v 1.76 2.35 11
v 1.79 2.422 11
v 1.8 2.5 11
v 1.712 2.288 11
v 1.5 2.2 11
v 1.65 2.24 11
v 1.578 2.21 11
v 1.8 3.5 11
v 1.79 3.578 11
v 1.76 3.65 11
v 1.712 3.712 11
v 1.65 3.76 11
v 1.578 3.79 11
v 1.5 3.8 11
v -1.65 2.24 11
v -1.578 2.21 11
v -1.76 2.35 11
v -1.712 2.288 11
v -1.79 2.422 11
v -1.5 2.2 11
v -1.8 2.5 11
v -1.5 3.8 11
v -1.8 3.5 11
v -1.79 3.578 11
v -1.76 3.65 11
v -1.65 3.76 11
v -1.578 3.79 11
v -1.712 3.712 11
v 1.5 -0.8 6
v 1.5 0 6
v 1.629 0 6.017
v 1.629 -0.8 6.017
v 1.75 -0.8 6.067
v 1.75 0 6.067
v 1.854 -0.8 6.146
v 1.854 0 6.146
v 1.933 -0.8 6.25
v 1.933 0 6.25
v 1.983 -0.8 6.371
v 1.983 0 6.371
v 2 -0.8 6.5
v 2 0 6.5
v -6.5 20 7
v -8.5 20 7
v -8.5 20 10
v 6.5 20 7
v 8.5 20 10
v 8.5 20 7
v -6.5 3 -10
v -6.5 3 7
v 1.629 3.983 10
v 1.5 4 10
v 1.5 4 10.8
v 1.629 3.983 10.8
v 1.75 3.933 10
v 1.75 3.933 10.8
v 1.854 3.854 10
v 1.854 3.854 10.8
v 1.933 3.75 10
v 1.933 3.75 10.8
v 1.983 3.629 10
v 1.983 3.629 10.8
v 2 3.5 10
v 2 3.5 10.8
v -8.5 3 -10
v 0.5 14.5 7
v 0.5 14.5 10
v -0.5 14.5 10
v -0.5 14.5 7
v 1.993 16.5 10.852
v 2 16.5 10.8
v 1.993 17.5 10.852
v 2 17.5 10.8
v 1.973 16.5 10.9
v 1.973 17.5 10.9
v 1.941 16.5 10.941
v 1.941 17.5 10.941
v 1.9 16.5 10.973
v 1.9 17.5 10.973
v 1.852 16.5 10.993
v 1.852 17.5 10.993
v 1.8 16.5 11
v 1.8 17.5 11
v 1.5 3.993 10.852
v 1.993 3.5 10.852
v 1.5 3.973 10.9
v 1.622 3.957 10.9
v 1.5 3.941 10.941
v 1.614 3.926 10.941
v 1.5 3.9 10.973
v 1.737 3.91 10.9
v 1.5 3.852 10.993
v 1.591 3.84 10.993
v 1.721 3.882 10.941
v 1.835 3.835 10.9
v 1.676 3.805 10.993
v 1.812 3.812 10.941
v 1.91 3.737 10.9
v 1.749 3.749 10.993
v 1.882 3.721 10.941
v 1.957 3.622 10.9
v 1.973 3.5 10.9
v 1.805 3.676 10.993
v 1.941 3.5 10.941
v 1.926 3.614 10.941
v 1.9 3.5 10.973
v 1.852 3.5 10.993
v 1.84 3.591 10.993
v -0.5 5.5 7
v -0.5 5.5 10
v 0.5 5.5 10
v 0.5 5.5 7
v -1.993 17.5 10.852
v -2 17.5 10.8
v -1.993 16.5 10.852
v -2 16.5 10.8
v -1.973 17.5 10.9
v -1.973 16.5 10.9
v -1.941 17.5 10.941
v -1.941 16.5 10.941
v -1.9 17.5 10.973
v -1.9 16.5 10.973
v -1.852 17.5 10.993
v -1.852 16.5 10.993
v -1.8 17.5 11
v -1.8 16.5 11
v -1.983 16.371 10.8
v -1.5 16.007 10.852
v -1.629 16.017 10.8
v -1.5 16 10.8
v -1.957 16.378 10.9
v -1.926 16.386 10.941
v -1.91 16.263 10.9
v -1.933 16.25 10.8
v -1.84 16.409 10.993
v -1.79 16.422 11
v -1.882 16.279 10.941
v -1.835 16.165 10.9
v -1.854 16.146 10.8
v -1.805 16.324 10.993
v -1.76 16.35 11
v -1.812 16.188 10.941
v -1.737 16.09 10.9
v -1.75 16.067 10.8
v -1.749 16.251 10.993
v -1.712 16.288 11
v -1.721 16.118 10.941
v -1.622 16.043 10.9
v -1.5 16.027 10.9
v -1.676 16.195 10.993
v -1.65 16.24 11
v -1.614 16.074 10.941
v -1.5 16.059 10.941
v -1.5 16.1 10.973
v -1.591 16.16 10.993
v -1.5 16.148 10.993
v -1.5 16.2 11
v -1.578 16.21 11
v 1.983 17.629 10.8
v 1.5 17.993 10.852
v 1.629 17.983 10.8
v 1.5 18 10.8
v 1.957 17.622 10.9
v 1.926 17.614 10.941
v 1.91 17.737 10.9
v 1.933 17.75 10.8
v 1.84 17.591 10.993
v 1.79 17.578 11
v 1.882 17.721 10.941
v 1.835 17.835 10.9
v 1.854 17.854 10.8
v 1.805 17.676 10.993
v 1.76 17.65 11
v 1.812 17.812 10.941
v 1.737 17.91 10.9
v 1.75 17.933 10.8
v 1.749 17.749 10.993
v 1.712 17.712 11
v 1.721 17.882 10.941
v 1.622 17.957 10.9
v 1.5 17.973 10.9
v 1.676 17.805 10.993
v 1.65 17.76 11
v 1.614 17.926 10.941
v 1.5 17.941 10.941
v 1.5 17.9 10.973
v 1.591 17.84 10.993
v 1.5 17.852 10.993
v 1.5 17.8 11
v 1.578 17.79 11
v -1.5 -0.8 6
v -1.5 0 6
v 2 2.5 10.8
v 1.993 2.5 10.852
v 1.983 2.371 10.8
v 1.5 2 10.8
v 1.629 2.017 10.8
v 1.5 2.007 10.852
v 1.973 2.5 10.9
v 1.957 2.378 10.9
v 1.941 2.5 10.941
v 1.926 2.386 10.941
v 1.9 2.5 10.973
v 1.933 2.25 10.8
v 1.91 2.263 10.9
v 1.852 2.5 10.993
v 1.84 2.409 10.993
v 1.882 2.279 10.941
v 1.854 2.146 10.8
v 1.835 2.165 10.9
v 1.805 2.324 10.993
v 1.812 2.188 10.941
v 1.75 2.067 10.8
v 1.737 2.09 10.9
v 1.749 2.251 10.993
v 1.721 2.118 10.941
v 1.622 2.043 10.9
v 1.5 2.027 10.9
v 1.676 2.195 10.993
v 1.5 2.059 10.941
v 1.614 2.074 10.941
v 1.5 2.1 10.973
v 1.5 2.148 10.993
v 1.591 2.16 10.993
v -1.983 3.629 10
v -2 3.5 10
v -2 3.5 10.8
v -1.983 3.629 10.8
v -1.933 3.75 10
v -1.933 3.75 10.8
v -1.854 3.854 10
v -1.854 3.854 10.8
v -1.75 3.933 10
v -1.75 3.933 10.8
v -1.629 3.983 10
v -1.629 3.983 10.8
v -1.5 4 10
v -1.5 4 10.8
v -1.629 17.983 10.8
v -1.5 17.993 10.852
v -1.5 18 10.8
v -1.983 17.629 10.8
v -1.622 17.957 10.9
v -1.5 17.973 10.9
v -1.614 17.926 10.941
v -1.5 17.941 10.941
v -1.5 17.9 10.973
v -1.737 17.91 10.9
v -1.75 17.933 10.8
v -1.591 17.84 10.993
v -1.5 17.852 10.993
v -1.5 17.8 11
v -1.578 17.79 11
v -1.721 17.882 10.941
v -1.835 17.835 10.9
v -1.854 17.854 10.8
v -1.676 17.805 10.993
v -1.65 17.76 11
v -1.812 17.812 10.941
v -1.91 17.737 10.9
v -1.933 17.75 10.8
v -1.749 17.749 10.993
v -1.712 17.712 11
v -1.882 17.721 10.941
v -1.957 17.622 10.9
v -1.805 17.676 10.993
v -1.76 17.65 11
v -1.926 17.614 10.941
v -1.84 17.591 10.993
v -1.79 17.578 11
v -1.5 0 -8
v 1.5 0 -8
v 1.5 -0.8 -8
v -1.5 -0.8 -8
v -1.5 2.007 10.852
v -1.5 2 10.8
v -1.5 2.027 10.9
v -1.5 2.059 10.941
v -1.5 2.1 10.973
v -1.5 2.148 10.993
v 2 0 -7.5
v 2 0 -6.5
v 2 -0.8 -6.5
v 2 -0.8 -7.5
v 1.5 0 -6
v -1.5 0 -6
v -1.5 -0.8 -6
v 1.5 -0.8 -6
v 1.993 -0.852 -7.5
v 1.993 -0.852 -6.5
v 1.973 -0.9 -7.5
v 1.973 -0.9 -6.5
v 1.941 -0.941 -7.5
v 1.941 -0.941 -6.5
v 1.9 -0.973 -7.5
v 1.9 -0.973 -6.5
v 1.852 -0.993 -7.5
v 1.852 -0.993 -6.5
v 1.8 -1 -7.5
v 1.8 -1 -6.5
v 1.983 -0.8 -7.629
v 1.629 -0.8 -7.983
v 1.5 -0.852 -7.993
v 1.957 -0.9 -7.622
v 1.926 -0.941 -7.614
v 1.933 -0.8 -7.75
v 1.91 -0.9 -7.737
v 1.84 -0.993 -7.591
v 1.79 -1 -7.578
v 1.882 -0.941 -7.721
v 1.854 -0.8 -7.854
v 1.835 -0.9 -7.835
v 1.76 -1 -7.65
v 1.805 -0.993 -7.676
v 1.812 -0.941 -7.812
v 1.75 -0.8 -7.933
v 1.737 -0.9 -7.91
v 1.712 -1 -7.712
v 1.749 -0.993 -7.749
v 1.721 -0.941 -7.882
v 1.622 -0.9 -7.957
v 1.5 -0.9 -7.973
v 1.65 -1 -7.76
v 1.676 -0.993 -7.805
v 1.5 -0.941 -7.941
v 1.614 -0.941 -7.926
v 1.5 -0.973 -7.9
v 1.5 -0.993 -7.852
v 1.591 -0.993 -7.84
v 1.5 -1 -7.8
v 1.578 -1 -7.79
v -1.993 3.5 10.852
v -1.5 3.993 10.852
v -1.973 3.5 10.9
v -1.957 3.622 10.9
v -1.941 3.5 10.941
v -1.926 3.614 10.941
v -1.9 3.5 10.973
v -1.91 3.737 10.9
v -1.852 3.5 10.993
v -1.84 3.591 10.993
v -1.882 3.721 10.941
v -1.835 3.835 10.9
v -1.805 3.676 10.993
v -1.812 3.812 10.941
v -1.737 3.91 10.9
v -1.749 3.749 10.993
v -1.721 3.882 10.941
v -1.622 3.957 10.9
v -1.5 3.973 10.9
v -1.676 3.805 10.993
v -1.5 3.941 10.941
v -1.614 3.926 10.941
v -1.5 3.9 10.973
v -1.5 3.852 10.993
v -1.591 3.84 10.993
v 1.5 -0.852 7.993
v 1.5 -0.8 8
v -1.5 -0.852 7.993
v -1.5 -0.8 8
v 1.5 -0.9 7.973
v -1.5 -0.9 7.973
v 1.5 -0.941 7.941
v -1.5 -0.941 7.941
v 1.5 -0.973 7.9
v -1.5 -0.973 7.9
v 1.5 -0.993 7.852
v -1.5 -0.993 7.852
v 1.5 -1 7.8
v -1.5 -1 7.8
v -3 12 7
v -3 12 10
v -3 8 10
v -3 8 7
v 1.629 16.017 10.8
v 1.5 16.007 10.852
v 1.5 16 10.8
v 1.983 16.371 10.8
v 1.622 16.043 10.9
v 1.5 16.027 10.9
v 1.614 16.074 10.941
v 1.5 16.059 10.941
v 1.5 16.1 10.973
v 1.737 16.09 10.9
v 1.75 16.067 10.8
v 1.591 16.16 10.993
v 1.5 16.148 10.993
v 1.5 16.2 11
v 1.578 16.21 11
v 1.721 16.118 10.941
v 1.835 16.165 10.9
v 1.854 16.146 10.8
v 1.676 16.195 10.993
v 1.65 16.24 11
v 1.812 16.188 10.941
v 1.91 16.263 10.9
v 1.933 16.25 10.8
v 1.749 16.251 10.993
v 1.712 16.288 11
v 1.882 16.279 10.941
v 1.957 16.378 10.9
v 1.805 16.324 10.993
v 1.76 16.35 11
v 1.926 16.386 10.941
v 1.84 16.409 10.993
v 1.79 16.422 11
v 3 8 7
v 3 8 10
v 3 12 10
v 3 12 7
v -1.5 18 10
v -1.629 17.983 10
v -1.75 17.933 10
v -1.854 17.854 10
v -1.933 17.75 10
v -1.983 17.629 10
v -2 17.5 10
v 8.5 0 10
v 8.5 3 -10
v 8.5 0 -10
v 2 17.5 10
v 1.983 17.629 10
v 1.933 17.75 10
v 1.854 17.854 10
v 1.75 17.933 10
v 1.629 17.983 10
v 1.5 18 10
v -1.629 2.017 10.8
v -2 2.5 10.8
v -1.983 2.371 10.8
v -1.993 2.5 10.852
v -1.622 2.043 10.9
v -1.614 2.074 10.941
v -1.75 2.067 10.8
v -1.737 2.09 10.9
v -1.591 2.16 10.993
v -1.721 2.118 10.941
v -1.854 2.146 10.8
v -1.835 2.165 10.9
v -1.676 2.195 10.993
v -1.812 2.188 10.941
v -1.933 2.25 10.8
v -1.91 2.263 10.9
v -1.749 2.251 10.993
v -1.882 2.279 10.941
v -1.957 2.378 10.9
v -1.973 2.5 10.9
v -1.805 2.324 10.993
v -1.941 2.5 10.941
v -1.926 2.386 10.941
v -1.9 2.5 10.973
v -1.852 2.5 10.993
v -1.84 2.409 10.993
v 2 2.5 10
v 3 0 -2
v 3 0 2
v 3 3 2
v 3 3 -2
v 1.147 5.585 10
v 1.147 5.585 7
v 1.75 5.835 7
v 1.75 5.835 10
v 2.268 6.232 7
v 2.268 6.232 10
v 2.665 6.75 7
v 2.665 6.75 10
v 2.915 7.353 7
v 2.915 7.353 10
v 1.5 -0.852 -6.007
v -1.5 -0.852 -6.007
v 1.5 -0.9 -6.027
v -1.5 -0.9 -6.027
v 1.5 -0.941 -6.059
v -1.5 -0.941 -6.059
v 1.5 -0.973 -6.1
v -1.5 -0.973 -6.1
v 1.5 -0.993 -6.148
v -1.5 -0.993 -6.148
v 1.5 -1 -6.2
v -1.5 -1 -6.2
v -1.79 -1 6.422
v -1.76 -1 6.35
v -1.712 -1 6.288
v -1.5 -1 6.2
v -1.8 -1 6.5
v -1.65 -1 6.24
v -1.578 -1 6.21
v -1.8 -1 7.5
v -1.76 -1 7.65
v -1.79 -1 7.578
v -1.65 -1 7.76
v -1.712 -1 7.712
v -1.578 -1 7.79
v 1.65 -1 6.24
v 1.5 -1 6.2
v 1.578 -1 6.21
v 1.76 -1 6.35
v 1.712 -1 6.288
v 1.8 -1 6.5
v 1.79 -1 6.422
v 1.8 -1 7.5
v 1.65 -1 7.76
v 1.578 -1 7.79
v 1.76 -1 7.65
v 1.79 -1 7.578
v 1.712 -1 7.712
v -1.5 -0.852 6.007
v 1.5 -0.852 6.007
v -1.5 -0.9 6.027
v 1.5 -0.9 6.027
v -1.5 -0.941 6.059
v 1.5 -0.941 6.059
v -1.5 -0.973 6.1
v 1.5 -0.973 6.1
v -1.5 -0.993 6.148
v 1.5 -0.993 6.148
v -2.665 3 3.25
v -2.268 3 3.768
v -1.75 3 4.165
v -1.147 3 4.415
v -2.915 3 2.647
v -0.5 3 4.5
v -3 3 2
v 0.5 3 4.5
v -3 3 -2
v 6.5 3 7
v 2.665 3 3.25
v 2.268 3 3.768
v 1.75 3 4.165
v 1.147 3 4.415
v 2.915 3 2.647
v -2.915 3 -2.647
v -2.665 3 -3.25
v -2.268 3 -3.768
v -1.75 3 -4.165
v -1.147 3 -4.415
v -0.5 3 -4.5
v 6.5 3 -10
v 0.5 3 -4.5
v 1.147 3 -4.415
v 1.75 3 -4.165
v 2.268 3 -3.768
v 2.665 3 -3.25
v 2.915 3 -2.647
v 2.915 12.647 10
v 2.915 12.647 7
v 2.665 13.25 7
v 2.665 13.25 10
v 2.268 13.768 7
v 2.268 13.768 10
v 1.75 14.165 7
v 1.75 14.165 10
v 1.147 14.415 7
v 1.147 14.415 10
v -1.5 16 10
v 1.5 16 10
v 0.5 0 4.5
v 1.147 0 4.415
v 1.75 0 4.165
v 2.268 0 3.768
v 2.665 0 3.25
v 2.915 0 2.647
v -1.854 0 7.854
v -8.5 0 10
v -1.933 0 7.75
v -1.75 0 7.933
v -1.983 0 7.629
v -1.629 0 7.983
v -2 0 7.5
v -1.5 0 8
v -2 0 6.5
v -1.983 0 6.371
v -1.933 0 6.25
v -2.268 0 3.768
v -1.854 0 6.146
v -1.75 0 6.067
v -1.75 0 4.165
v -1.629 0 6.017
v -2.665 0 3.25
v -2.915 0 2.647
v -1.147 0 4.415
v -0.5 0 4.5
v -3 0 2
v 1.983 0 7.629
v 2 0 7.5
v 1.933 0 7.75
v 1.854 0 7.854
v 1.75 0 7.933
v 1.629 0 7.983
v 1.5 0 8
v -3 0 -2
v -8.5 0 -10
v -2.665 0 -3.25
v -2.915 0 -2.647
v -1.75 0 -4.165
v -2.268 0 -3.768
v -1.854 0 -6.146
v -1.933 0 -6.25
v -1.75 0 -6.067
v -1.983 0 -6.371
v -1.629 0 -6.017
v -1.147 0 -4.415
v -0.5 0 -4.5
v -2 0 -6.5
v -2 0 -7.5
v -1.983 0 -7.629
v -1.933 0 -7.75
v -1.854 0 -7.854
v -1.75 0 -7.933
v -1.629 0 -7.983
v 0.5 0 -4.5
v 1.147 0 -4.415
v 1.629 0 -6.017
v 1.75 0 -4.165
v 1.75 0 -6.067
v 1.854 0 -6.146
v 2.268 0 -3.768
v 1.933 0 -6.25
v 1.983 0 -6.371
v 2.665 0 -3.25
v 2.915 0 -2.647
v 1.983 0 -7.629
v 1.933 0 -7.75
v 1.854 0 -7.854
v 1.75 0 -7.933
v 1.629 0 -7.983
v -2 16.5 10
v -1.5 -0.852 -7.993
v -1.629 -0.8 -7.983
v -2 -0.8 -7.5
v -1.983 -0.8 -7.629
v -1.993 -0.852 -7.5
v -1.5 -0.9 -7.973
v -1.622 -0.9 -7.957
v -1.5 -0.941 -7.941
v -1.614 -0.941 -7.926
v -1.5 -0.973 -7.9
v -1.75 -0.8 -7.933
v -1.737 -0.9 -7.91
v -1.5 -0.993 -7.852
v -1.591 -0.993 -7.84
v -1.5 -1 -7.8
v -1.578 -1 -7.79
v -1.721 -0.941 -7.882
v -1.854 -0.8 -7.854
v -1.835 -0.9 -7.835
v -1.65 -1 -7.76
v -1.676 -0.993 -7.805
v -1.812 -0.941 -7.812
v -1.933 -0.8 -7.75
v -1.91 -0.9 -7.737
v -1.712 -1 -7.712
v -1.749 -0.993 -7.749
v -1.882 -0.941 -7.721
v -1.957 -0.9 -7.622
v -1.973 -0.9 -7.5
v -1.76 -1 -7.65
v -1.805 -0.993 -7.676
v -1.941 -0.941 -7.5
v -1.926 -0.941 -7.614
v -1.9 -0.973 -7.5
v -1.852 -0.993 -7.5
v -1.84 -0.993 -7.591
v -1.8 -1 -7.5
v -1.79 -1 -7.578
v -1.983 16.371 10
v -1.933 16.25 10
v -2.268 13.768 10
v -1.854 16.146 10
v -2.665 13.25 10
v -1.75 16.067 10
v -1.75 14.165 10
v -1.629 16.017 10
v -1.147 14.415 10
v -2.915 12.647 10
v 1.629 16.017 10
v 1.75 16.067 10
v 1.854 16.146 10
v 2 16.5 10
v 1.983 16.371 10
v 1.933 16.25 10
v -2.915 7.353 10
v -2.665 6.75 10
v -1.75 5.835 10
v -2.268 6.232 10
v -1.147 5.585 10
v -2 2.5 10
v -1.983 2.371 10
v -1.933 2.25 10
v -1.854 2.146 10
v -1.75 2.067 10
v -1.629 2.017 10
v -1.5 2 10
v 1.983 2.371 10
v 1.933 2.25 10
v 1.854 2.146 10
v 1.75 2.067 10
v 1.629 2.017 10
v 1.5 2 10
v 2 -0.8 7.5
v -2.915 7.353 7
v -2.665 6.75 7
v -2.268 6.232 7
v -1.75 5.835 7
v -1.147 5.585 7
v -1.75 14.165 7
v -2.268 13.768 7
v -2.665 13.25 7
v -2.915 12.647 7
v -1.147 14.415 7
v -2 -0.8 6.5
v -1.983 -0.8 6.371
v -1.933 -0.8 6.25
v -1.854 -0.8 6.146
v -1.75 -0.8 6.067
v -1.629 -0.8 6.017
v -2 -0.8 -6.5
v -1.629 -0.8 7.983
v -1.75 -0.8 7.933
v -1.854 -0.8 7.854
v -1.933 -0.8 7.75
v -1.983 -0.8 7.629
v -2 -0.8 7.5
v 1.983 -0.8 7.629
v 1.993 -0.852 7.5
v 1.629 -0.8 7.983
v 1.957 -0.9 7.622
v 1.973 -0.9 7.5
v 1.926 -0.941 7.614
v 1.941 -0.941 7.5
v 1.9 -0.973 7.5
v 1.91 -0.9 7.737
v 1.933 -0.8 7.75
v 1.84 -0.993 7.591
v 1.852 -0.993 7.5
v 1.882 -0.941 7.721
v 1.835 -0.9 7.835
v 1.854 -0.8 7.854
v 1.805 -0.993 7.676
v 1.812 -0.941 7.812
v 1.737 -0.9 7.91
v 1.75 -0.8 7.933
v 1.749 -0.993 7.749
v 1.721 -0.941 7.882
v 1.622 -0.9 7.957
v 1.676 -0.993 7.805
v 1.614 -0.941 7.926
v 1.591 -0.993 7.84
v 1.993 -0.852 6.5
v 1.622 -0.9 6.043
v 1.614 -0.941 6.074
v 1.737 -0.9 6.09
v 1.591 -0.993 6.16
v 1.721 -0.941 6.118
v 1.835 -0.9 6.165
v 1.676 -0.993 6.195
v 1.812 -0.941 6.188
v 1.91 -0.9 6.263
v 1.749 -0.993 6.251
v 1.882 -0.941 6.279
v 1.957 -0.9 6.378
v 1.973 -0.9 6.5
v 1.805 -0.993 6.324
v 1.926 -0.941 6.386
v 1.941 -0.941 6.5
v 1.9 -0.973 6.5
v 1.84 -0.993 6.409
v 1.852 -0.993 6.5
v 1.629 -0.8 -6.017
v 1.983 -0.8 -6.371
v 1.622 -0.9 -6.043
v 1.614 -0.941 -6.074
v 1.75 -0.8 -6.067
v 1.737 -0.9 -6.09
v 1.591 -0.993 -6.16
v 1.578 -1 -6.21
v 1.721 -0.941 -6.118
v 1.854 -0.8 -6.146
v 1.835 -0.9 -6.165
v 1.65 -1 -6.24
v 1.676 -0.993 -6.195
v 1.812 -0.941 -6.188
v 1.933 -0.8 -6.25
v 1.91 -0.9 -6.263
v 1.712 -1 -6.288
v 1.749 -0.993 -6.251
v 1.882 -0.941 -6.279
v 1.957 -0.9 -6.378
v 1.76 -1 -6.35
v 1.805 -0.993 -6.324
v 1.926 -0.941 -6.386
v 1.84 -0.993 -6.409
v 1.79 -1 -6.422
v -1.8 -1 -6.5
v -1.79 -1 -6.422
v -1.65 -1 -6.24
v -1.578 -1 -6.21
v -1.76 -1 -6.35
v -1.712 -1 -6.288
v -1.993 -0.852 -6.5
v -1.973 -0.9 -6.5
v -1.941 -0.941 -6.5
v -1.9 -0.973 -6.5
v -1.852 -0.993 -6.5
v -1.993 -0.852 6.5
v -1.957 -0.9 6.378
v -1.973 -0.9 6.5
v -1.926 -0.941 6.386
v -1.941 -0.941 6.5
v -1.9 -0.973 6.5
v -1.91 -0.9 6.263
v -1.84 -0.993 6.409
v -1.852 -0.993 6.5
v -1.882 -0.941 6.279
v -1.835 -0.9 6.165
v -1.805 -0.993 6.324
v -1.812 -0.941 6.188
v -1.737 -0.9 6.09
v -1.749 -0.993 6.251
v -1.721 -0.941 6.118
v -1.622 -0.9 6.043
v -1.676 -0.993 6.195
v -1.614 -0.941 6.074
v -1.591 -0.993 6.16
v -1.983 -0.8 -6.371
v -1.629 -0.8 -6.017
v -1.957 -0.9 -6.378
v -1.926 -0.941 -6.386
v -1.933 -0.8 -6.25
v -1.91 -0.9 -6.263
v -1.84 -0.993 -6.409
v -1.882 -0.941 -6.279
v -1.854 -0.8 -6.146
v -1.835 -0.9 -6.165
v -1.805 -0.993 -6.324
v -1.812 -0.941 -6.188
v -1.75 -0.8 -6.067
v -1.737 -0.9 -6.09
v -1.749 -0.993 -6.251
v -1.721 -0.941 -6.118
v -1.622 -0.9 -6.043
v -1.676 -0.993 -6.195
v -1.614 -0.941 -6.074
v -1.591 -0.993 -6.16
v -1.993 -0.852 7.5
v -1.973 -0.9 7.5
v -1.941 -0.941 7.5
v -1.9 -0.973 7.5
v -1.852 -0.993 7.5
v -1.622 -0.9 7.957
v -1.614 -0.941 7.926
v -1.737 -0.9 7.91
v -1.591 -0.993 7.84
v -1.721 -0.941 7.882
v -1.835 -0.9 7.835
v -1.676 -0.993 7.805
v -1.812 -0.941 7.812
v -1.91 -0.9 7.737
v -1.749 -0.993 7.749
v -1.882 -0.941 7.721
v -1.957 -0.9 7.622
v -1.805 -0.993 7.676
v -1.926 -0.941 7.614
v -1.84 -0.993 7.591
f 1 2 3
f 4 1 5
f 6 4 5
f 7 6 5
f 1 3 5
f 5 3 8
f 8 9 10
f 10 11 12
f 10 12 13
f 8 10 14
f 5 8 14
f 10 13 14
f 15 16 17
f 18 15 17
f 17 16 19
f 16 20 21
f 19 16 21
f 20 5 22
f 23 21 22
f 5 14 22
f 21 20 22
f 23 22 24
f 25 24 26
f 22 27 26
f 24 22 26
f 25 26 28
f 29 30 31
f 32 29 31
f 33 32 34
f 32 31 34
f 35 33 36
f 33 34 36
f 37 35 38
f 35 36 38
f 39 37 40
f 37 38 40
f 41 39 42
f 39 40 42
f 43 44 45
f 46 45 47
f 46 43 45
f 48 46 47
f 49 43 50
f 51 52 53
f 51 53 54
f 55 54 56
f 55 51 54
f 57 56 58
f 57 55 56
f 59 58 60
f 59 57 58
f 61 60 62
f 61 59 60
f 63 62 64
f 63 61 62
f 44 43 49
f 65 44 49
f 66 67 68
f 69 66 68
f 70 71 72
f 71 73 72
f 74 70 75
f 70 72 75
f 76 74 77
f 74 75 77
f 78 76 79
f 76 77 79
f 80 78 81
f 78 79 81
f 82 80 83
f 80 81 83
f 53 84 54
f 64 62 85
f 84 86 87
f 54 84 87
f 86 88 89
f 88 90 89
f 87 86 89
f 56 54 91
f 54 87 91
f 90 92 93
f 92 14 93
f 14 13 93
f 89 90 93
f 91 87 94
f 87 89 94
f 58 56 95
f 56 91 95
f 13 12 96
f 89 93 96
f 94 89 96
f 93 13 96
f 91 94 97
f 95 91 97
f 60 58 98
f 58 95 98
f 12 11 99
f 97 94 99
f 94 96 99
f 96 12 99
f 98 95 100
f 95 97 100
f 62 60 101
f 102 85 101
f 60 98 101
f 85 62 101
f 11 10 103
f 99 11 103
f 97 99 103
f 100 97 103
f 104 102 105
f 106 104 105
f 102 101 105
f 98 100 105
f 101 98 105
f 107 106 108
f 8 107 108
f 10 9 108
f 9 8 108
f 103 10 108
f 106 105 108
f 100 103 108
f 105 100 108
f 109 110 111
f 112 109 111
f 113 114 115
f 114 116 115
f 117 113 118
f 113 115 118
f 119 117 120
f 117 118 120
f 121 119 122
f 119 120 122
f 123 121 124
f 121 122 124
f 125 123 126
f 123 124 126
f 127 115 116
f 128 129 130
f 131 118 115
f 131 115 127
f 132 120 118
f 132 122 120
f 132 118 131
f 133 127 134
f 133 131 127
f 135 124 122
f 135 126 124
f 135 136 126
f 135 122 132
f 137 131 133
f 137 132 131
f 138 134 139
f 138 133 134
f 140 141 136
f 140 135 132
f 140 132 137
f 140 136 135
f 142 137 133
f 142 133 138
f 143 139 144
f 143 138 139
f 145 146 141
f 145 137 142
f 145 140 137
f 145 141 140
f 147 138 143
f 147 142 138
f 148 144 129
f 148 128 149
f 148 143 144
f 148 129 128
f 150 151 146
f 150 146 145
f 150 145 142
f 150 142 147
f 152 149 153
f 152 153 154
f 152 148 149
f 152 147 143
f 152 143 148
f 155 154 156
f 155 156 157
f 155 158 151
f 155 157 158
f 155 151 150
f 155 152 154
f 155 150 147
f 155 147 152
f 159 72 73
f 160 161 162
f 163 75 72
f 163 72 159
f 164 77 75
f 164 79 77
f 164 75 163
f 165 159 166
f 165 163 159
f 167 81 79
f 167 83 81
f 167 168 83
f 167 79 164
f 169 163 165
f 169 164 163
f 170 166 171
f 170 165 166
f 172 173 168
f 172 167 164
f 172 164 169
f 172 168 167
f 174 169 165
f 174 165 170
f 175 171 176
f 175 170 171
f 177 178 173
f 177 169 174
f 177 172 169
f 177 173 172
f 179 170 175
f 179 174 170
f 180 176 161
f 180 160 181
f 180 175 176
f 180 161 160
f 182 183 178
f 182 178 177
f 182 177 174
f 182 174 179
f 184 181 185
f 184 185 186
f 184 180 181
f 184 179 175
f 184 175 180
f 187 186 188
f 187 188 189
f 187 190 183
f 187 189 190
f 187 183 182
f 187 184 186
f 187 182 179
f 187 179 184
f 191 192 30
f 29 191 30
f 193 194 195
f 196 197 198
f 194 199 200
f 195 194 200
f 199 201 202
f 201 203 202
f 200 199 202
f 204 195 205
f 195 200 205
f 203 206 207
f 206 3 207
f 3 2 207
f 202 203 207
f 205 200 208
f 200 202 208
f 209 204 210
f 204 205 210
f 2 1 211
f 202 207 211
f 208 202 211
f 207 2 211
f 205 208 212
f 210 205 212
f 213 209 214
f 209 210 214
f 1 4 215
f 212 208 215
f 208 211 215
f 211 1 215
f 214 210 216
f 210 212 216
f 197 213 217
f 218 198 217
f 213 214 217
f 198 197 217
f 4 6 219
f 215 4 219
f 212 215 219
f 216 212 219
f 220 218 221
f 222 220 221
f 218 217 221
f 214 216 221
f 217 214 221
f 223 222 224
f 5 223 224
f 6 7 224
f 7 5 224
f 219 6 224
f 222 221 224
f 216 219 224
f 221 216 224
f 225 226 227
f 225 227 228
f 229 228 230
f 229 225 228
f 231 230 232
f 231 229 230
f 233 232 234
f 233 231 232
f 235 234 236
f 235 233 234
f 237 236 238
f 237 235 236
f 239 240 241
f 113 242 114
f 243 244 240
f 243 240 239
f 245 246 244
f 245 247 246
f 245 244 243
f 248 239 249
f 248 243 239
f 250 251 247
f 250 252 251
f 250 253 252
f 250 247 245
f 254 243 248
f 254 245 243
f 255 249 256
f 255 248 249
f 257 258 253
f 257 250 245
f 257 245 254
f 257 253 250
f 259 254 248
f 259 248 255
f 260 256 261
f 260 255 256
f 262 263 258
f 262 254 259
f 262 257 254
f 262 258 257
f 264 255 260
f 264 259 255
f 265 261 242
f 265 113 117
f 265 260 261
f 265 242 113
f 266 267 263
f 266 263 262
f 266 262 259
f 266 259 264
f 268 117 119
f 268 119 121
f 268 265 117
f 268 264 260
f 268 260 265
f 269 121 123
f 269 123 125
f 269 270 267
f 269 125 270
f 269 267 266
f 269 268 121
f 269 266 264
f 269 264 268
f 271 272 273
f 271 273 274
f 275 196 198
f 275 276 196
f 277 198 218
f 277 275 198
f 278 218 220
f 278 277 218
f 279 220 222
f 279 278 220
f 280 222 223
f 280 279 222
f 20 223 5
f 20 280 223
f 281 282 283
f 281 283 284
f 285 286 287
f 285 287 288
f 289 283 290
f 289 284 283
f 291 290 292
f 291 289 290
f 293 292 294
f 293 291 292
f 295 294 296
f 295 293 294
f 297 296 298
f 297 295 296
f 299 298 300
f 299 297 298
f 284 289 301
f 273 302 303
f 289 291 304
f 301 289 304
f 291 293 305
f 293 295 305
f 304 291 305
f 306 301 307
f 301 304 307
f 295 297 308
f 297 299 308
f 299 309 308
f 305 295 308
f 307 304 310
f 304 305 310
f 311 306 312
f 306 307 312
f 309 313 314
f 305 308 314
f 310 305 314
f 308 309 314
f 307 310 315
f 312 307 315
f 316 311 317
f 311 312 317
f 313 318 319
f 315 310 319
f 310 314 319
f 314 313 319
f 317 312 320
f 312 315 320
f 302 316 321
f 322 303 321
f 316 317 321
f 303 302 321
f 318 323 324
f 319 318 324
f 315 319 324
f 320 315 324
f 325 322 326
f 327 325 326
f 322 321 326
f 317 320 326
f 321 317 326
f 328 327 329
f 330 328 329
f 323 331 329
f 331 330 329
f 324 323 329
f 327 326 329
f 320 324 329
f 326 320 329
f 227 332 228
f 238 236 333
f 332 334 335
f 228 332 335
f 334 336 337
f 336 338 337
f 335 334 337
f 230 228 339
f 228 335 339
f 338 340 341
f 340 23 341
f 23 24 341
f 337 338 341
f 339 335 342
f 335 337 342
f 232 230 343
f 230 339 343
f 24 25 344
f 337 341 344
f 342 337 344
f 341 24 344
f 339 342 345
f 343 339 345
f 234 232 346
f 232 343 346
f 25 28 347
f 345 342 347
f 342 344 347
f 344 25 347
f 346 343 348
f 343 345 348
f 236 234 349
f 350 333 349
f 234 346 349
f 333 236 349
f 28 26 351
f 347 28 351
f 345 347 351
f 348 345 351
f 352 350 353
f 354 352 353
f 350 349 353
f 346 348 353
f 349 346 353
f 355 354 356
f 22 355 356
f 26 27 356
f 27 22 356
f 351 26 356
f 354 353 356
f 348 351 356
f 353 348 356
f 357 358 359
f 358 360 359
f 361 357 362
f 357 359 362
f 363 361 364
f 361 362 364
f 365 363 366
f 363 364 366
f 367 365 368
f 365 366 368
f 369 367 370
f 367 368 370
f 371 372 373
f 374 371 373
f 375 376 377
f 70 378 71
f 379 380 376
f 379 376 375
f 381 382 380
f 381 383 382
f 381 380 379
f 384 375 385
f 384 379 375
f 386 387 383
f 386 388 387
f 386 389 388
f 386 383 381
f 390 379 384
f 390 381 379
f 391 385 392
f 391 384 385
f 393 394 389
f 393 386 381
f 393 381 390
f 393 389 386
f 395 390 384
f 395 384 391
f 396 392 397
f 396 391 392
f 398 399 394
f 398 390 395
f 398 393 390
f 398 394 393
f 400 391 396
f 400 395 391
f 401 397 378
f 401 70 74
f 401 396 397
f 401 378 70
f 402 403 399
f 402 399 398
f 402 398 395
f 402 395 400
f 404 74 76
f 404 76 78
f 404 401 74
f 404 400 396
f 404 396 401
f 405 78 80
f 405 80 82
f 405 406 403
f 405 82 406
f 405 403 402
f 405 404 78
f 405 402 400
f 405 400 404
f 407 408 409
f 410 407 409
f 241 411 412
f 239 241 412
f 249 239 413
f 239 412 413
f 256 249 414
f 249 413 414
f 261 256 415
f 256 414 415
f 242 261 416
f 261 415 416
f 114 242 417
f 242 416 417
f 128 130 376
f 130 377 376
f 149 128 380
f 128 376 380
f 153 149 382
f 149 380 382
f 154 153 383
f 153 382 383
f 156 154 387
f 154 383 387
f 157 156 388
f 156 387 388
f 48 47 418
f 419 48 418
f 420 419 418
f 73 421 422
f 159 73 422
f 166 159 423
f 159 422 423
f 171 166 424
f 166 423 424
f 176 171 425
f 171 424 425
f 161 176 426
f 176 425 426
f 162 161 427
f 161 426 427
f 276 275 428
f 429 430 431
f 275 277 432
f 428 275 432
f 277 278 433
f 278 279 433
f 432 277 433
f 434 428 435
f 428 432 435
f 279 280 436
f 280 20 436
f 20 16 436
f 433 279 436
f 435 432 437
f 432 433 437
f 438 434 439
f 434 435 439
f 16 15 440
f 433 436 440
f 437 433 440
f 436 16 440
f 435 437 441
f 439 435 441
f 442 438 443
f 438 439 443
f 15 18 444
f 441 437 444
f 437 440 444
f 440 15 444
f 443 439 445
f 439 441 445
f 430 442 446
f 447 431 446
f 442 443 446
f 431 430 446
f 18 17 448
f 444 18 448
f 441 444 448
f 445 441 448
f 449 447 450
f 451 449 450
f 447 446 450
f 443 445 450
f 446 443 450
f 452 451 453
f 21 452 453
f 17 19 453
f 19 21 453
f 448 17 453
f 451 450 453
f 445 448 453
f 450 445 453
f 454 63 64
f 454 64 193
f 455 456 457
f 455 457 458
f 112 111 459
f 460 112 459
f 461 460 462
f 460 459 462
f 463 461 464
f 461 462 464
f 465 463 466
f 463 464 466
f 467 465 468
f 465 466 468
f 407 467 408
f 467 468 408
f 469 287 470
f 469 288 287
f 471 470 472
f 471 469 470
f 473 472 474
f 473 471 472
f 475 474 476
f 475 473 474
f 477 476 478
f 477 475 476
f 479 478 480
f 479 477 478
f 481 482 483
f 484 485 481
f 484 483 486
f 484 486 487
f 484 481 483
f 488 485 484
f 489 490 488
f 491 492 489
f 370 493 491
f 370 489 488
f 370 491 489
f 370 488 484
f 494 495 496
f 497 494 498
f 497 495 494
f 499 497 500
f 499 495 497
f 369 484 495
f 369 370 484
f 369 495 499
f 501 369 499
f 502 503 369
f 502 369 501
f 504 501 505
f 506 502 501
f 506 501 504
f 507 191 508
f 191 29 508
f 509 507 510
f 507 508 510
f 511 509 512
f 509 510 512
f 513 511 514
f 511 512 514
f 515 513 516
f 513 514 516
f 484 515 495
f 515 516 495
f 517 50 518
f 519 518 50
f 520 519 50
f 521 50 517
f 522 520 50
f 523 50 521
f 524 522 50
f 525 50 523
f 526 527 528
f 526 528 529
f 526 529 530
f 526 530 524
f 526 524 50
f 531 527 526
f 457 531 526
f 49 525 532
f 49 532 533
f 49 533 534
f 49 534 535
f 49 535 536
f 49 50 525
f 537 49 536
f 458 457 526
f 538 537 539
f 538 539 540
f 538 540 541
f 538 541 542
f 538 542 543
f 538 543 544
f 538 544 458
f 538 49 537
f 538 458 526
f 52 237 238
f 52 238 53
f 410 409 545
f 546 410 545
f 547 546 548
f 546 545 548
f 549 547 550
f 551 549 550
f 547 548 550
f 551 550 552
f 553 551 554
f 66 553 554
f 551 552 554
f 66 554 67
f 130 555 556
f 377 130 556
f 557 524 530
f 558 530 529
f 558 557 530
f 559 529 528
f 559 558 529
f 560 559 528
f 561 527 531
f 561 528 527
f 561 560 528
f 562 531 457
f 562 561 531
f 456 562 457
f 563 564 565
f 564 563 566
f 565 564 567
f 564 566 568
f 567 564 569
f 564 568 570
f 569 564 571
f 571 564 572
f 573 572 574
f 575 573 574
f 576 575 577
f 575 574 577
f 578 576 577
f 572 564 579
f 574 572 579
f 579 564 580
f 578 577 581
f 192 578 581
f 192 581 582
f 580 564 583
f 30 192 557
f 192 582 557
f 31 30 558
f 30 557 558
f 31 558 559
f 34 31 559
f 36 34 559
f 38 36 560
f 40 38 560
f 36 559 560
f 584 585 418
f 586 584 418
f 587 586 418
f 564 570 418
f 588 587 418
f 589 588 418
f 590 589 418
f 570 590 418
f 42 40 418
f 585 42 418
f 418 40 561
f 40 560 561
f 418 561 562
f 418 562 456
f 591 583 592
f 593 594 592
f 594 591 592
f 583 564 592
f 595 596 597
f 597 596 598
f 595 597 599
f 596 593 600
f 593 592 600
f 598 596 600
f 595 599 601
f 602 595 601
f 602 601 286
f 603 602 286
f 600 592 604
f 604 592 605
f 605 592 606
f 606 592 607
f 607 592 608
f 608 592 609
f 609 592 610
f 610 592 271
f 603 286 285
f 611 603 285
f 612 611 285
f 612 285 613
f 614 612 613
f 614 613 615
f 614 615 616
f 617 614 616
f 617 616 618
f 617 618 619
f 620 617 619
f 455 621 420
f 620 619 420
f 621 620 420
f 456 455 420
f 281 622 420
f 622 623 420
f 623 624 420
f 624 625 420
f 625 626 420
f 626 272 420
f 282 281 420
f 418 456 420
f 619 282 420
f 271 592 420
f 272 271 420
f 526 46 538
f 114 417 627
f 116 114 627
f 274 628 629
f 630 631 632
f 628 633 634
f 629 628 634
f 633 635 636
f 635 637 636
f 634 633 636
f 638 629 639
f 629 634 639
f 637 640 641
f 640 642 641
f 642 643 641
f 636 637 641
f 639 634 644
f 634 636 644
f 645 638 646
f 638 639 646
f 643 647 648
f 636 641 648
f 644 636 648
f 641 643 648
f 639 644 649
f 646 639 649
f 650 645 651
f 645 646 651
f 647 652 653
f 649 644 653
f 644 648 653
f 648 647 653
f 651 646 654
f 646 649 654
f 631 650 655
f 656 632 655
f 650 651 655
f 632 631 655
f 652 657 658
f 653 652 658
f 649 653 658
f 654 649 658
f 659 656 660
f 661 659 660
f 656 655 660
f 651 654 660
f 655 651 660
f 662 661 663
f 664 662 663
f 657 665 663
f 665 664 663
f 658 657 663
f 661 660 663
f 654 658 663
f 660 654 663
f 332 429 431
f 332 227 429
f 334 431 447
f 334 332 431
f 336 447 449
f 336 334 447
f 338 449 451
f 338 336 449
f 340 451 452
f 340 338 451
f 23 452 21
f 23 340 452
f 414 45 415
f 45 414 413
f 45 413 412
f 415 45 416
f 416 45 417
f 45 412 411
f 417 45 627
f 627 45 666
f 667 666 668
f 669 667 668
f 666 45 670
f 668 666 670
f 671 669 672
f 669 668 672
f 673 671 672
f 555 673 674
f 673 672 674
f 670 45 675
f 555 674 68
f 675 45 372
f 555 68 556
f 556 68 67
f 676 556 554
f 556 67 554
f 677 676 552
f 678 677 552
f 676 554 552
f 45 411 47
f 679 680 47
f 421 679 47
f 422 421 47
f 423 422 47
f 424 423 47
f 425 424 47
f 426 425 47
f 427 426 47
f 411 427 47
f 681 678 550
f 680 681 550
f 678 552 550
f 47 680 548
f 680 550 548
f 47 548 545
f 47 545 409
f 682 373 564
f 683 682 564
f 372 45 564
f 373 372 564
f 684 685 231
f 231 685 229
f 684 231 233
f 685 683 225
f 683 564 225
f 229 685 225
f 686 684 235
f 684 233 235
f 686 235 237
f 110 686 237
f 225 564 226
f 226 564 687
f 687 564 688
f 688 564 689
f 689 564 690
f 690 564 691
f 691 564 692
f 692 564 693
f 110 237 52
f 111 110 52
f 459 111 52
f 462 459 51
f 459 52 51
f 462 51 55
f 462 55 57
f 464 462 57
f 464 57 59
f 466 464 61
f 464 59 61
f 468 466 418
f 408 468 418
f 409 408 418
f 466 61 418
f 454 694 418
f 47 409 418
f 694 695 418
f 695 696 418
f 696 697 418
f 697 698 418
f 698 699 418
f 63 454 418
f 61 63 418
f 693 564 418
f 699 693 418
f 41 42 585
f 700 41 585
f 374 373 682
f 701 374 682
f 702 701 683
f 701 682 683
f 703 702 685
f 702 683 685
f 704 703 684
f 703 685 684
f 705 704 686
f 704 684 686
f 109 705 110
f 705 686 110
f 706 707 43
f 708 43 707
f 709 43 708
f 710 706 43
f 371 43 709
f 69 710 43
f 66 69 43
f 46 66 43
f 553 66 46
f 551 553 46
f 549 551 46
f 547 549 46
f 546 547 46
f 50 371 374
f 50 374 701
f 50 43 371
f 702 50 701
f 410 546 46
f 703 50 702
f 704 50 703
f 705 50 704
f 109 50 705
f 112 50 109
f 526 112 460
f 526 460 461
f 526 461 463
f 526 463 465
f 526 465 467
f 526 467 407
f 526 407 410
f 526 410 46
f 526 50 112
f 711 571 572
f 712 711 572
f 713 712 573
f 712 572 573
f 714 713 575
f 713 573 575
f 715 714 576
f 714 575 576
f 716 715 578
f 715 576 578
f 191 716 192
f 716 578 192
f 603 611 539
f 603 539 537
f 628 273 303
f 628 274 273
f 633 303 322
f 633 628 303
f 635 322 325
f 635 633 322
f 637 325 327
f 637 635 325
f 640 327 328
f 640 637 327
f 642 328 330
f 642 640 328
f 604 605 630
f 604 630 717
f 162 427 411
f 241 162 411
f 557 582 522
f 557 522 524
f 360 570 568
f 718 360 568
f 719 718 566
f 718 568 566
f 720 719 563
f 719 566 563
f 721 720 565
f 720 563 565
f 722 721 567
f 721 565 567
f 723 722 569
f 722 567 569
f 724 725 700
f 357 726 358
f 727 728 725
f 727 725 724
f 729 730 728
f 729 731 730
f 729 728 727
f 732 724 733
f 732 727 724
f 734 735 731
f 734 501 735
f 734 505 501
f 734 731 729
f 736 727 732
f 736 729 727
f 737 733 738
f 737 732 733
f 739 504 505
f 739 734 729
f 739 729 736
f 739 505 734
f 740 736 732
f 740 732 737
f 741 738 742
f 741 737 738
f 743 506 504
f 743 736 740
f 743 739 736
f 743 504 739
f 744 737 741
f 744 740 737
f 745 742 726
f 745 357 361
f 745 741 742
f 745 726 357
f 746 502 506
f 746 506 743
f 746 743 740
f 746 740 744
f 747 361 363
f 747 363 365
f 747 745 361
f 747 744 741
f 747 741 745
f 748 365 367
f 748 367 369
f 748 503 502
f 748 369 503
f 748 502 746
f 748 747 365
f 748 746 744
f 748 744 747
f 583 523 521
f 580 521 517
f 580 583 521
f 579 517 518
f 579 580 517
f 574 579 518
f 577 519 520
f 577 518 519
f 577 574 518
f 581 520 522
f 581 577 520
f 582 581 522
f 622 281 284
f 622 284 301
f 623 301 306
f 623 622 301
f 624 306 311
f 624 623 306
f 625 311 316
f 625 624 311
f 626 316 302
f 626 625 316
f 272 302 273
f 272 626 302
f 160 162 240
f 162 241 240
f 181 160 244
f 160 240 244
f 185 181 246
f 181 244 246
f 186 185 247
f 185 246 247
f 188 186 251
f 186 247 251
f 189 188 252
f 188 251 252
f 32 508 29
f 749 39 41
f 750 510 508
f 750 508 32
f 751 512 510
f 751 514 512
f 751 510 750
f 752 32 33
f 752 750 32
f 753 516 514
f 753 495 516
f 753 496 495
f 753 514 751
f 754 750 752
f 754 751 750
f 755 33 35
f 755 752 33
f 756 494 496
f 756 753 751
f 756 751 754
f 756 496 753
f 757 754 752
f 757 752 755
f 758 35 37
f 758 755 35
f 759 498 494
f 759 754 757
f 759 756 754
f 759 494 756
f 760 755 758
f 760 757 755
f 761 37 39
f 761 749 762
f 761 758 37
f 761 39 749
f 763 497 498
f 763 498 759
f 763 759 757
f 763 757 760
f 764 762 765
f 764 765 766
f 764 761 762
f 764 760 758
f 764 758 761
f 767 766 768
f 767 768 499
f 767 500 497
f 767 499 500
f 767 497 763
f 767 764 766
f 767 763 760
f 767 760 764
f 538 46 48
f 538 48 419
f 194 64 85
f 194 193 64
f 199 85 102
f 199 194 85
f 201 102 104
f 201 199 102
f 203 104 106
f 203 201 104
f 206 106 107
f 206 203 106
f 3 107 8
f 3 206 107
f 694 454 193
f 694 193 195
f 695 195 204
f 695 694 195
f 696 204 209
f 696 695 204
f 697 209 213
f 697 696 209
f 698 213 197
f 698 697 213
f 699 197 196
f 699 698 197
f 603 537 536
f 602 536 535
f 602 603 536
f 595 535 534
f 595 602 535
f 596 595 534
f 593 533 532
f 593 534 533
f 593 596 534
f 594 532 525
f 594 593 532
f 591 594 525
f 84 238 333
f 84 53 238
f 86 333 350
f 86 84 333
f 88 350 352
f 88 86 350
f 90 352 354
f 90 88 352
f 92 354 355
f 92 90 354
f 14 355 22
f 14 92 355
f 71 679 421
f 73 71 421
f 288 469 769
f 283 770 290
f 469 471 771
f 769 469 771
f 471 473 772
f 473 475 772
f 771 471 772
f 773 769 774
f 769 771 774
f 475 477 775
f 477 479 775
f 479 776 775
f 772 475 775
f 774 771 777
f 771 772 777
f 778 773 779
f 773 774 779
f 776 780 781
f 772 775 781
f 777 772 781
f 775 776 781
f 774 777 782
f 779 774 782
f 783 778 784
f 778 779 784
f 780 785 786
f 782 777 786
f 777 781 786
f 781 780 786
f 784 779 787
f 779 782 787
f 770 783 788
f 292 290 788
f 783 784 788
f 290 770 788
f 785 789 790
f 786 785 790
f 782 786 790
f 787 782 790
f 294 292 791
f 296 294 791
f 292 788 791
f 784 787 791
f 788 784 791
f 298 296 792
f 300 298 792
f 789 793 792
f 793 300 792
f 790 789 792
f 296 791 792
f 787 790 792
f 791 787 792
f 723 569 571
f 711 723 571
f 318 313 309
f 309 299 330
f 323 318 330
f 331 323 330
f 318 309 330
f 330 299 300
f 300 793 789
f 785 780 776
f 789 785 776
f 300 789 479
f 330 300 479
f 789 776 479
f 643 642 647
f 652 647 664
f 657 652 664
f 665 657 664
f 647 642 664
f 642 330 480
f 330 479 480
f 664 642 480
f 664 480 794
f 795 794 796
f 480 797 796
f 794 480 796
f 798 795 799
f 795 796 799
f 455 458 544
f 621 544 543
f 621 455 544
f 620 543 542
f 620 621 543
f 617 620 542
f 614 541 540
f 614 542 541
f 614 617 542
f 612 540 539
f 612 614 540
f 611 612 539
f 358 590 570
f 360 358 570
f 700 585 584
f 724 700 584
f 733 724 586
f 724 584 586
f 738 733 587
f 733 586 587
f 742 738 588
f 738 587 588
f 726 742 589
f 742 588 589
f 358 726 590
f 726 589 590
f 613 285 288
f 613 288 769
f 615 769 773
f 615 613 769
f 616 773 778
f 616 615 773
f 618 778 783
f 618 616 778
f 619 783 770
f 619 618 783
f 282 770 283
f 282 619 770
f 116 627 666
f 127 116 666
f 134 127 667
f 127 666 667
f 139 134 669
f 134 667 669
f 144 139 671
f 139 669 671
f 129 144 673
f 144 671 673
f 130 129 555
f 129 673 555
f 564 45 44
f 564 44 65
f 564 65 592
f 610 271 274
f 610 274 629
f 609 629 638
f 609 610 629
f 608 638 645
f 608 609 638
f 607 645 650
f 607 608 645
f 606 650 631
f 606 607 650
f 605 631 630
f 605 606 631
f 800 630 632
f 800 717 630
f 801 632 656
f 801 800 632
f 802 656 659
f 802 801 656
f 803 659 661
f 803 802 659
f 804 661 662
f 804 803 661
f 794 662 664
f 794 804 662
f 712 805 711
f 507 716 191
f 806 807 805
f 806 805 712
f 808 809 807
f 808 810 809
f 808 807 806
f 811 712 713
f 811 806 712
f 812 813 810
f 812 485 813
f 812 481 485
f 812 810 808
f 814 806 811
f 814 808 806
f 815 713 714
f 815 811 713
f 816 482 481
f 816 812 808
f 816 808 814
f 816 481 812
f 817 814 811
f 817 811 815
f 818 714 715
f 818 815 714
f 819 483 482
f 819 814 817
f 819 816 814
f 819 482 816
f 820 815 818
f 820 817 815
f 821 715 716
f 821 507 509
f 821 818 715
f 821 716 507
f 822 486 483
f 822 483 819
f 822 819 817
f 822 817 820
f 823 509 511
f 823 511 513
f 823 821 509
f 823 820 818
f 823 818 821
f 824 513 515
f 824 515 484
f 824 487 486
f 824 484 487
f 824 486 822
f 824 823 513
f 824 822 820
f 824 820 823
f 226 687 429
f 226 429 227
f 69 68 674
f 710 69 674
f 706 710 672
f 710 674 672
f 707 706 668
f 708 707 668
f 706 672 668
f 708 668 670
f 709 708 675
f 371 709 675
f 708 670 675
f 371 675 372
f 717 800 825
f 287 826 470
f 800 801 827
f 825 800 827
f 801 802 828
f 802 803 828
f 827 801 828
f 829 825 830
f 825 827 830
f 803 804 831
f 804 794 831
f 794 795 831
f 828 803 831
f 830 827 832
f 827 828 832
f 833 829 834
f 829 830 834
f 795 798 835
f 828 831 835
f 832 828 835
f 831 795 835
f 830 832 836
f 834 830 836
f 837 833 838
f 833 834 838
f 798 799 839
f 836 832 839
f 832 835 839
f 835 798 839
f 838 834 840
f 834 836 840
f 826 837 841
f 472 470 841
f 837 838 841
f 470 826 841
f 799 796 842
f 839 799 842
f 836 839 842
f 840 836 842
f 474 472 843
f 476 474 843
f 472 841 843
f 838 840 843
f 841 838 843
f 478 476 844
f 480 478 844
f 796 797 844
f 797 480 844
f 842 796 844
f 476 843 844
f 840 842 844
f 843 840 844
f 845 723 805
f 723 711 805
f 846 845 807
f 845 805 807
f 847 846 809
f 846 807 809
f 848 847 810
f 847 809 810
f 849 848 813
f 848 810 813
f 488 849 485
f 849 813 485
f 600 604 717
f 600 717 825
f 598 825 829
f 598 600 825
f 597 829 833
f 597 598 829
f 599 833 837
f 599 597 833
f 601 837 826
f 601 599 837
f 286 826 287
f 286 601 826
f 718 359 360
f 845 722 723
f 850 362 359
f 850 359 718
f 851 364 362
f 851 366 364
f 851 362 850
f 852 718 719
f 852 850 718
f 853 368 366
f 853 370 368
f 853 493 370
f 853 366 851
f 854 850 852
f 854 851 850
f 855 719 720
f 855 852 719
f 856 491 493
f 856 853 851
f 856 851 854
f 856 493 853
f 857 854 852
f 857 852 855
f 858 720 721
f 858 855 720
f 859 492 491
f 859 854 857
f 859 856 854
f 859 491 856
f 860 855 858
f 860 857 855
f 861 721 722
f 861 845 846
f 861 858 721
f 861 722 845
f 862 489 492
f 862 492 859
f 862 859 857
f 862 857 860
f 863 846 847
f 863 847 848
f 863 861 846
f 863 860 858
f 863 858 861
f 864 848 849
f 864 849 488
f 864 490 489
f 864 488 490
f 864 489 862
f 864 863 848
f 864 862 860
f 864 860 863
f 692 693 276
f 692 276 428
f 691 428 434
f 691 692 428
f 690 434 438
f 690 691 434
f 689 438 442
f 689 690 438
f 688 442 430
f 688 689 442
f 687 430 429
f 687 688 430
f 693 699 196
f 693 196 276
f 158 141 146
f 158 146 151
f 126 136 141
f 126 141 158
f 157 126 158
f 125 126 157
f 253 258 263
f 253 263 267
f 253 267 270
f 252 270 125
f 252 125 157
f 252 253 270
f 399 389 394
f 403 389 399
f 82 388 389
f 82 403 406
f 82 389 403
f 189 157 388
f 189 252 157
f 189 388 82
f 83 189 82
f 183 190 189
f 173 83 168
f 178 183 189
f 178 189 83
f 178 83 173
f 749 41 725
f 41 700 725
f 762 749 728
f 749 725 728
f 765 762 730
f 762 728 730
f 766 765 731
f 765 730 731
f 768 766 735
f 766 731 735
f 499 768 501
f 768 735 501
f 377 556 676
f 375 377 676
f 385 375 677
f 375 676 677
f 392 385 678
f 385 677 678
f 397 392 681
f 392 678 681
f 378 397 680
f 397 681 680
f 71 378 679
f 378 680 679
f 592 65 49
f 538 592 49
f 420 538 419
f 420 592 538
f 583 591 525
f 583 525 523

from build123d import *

# Parameters (mm, degrees)
SKETCH1_W           = 17
SKETCH1_H           = 20
BOSS_EXTRUDE1_DEPTH = 3
SKETCH2_W           = 17
SKETCH2_H           = 3
BOSS_EXTRUDE2_DEPTH = 17
RIB1_REACH          = 30.089
SKETCH3_WALL_W      = 82.219918182
SKETCH3_WALL_H      = 2
RIB4_REACH          = 30.089
SKETCH4_WALL_W      = 82.219918182
SKETCH4_WALL_H      = 2
CUT_EXTRUDE1_DEPTH  = 17
CUT_EXTRUDE2_DEPTH  = 17
BOSS_EXTRUDE3_DEPTH = 1
BOSS_EXTRUDE4_DEPTH = 1
FILLET1_R           = 0.2


with BuildPart() as part:
    # Sketch1 → Boss-Extrude1 (new body)
    with BuildSketch(Plane(origin=(0, 0, 0), x_dir=(1, 0, 0), z_dir=(0, 1, 0))):
        Rectangle(SKETCH1_W, SKETCH1_H)
    extrude(amount=BOSS_EXTRUDE1_DEPTH)

    # Sketch2 → Boss-Extrude2 (add)
    with BuildSketch(Plane(origin=(0, 3, 0), x_dir=(1, 0, 0), z_dir=(0, 1, 0))):
        with Locations((0, -8.5)):
            Rectangle(SKETCH2_W, SKETCH2_H)
    extrude(amount=BOSS_EXTRUDE2_DEPTH)

    # Sketch3 wall → Rib1 (add, up to next)
    with BuildSketch(Plane(origin=(8.5, 11.5, -1.5), x_dir=(0, -0.707106781187, -0.707106781187), z_dir=(0, 0.707106781187, -0.707106781187)), mode=Mode.PRIVATE) as rib1_sk1:
        with Locations((0, 1)):
            Rectangle(SKETCH3_WALL_W, SKETCH3_WALL_H)
    rib1_tool1 = extrude(rib1_sk1.sketch, amount=-RIB1_REACH, mode=Mode.PRIVATE) - part.part
    add(rib1_tool1.solids().sort_by_distance((8.5, 11.5, -1.5))[0])

    # Sketch4 wall → Rib4 (add, up to next)
    with BuildSketch(Plane(origin=(-8.5, 11.5, -1.5), x_dir=(0, -0.707106781187, -0.707106781187), z_dir=(0, -0.707106781187, 0.707106781187)), mode=Mode.PRIVATE) as rib4_sk1:
        with Locations((0, 1)):
            Rectangle(SKETCH4_WALL_W, SKETCH4_WALL_H)
    rib4_tool1 = extrude(rib4_sk1.sketch, amount=RIB4_REACH, mode=Mode.PRIVATE) - part.part
    add(rib4_tool1.solids().sort_by_distance((-8.5, 11.5, -1.5))[0])

    # Sketch5 → Cut-Extrude1 (cut)
    with BuildSketch(Plane.XY.offset(10)):
        with BuildLine():
            Line((-0.5, 5.5), (0.5, 5.5))
            ThreePointArc((0.5, 5.5), (2.267766953, 6.232233047), (3, 8))
            Line((3, 8), (3, 12))
            ThreePointArc((3, 12), (2.267766953, 13.767766953), (0.5, 14.5))
            Line((0.5, 14.5), (-0.5, 14.5))
            ThreePointArc((-0.5, 14.5), (-2.267766953, 13.767766953), (-3, 12))
            Line((-3, 12), (-3, 8))
            ThreePointArc((-3, 8), (-2.267766953, 6.232233047), (-0.5, 5.5))
        make_face()
    extrude(amount=-CUT_EXTRUDE1_DEPTH, mode=Mode.SUBTRACT)

    # Sketch6 → Cut-Extrude2 (cut)
    with BuildSketch(Plane.XZ):
        with BuildLine():
            Line((-0.5, 4.5), (0.5, 4.5))
            ThreePointArc((0.5, 4.5), (2.267766953, 3.767766953), (3, 2))
            Line((3, 2), (3, -2))
            ThreePointArc((3, -2), (2.267766953, -3.767766953), (0.5, -4.5))
            Line((0.5, -4.5), (-0.5, -4.5))
            ThreePointArc((-0.5, -4.5), (-2.267766953, -3.767766953), (-3, -2))
            Line((-3, -2), (-3, 2))
            ThreePointArc((-3, 2), (-2.267766953, 3.767766953), (-0.5, 4.5))
        make_face()
    extrude(amount=-CUT_EXTRUDE2_DEPTH, mode=Mode.SUBTRACT)

    # Sketch7 → Boss-Extrude3 (add)
    with BuildSketch(Plane.XZ):
        with BuildLine():
            Line((1.5, 8), (-1.5, 8))
            ThreePointArc((-1.5, 8), (-1.853553391, 7.853553391), (-2, 7.5))
            Line((-2, 7.5), (-2, 6.5))
            ThreePointArc((-2, 6.5), (-1.853553391, 6.146446609), (-1.5, 6))
            Line((-1.5, 6), (1.5, 6))
            ThreePointArc((1.5, 6), (1.853553391, 6.146446609), (2, 6.5))
            Line((2, 6.5), (2, 7.5))
            ThreePointArc((2, 7.5), (1.853553391, 7.853553391), (1.5, 8))
        make_face()
        with BuildLine():
            Line((-2, -7.5), (-2, -6.5))
            ThreePointArc((-2, -6.5), (-1.853553391, -6.146446609), (-1.5, -6))
            Line((-1.5, -6), (1.5, -6))
            ThreePointArc((1.5, -6), (1.853553391, -6.146446609), (2, -6.5))
            Line((2, -6.5), (2, -7.5))
            ThreePointArc((2, -7.5), (1.853553391, -7.853553391), (1.5, -8))
            Line((1.5, -8), (-1.5, -8))
            ThreePointArc((-1.5, -8), (-1.853553391, -7.853553391), (-2, -7.5))
        make_face()
    extrude(amount=BOSS_EXTRUDE3_DEPTH)

    # Sketch8 → Boss-Extrude4 (add)
    with BuildSketch(Plane.XY.offset(10)):
        with BuildLine():
            Line((-1.5, 4), (1.5, 4))
            ThreePointArc((1.5, 4), (1.853553391, 3.853553391), (2, 3.5))
            Line((2, 3.5), (2, 2.5))
            ThreePointArc((2, 2.5), (1.853553391, 2.146446609), (1.5, 2))
            Line((1.5, 2), (-1.5, 2))
            ThreePointArc((-1.5, 2), (-1.853553391, 2.146446609), (-2, 2.5))
            Line((-2, 2.5), (-2, 3.5))
            ThreePointArc((-2, 3.5), (-1.853553391, 3.853553391), (-1.5, 4))
        make_face()
        with BuildLine():
            Line((2, 16.5), (2, 17.5))
            ThreePointArc((2, 17.5), (1.853553391, 17.853553391), (1.5, 18))
            Line((1.5, 18), (-1.5, 18))
            ThreePointArc((-1.5, 18), (-1.853553391, 17.853553391), (-2, 17.5))
            Line((-2, 17.5), (-2, 16.5))
            ThreePointArc((-2, 16.5), (-1.853553391, 16.146446609), (-1.5, 16))
            Line((-1.5, 16), (1.5, 16))
            ThreePointArc((1.5, 16), (1.853553391, 16.146446609), (2, 16.5))
        make_face()
    extrude(amount=BOSS_EXTRUDE4_DEPTH)

    # Fillet1
    fillet1_edges = [part.edges().sort_by_distance(p)[0] for p in [
        (-1.853553391, -1, 7.853553391),
        (-2, -1, 7),
        (-1.853553391, -1, 6.146446609),
        (0, -1, 6),
        (1.853553391, -1, 6.146446609),
        (2, -1, 7),
        (1.853553391, -1, 7.853553391),
        (0, -1, 8),
        (1.853553391, -1, -7.853553391),
        (2, -1, -7),
        (1.853553391, -1, -6.146446609),
        (0, -1, -6),
        (-1.853553391, -1, -6.146446609),
        (-2, -1, -7),
        (-1.853553391, -1, -7.853553391),
        (0, -1, -8),
        (-1.853553391, 3.853553391, 11),
        (-2, 3, 11),
        (-1.853553391, 2.146446609, 11),
        (0, 2, 11),
        (1.853553391, 2.146446609, 11),
        (2, 3, 11),
        (1.853553391, 3.853553391, 11),
        (0, 4, 11),
        (1.853553391, 16.146446609, 11),
        (2, 17, 11),
        (1.853553391, 17.853553391, 11),
        (0, 18, 11),
        (-1.853553391, 17.853553391, 11),
        (-2, 17, 11),
        (-1.853553391, 16.146446609, 11),
        (0, 16, 11),
    ]]
    fillet(fillet1_edges, radius=FILLET1_R)


solid = part.part
